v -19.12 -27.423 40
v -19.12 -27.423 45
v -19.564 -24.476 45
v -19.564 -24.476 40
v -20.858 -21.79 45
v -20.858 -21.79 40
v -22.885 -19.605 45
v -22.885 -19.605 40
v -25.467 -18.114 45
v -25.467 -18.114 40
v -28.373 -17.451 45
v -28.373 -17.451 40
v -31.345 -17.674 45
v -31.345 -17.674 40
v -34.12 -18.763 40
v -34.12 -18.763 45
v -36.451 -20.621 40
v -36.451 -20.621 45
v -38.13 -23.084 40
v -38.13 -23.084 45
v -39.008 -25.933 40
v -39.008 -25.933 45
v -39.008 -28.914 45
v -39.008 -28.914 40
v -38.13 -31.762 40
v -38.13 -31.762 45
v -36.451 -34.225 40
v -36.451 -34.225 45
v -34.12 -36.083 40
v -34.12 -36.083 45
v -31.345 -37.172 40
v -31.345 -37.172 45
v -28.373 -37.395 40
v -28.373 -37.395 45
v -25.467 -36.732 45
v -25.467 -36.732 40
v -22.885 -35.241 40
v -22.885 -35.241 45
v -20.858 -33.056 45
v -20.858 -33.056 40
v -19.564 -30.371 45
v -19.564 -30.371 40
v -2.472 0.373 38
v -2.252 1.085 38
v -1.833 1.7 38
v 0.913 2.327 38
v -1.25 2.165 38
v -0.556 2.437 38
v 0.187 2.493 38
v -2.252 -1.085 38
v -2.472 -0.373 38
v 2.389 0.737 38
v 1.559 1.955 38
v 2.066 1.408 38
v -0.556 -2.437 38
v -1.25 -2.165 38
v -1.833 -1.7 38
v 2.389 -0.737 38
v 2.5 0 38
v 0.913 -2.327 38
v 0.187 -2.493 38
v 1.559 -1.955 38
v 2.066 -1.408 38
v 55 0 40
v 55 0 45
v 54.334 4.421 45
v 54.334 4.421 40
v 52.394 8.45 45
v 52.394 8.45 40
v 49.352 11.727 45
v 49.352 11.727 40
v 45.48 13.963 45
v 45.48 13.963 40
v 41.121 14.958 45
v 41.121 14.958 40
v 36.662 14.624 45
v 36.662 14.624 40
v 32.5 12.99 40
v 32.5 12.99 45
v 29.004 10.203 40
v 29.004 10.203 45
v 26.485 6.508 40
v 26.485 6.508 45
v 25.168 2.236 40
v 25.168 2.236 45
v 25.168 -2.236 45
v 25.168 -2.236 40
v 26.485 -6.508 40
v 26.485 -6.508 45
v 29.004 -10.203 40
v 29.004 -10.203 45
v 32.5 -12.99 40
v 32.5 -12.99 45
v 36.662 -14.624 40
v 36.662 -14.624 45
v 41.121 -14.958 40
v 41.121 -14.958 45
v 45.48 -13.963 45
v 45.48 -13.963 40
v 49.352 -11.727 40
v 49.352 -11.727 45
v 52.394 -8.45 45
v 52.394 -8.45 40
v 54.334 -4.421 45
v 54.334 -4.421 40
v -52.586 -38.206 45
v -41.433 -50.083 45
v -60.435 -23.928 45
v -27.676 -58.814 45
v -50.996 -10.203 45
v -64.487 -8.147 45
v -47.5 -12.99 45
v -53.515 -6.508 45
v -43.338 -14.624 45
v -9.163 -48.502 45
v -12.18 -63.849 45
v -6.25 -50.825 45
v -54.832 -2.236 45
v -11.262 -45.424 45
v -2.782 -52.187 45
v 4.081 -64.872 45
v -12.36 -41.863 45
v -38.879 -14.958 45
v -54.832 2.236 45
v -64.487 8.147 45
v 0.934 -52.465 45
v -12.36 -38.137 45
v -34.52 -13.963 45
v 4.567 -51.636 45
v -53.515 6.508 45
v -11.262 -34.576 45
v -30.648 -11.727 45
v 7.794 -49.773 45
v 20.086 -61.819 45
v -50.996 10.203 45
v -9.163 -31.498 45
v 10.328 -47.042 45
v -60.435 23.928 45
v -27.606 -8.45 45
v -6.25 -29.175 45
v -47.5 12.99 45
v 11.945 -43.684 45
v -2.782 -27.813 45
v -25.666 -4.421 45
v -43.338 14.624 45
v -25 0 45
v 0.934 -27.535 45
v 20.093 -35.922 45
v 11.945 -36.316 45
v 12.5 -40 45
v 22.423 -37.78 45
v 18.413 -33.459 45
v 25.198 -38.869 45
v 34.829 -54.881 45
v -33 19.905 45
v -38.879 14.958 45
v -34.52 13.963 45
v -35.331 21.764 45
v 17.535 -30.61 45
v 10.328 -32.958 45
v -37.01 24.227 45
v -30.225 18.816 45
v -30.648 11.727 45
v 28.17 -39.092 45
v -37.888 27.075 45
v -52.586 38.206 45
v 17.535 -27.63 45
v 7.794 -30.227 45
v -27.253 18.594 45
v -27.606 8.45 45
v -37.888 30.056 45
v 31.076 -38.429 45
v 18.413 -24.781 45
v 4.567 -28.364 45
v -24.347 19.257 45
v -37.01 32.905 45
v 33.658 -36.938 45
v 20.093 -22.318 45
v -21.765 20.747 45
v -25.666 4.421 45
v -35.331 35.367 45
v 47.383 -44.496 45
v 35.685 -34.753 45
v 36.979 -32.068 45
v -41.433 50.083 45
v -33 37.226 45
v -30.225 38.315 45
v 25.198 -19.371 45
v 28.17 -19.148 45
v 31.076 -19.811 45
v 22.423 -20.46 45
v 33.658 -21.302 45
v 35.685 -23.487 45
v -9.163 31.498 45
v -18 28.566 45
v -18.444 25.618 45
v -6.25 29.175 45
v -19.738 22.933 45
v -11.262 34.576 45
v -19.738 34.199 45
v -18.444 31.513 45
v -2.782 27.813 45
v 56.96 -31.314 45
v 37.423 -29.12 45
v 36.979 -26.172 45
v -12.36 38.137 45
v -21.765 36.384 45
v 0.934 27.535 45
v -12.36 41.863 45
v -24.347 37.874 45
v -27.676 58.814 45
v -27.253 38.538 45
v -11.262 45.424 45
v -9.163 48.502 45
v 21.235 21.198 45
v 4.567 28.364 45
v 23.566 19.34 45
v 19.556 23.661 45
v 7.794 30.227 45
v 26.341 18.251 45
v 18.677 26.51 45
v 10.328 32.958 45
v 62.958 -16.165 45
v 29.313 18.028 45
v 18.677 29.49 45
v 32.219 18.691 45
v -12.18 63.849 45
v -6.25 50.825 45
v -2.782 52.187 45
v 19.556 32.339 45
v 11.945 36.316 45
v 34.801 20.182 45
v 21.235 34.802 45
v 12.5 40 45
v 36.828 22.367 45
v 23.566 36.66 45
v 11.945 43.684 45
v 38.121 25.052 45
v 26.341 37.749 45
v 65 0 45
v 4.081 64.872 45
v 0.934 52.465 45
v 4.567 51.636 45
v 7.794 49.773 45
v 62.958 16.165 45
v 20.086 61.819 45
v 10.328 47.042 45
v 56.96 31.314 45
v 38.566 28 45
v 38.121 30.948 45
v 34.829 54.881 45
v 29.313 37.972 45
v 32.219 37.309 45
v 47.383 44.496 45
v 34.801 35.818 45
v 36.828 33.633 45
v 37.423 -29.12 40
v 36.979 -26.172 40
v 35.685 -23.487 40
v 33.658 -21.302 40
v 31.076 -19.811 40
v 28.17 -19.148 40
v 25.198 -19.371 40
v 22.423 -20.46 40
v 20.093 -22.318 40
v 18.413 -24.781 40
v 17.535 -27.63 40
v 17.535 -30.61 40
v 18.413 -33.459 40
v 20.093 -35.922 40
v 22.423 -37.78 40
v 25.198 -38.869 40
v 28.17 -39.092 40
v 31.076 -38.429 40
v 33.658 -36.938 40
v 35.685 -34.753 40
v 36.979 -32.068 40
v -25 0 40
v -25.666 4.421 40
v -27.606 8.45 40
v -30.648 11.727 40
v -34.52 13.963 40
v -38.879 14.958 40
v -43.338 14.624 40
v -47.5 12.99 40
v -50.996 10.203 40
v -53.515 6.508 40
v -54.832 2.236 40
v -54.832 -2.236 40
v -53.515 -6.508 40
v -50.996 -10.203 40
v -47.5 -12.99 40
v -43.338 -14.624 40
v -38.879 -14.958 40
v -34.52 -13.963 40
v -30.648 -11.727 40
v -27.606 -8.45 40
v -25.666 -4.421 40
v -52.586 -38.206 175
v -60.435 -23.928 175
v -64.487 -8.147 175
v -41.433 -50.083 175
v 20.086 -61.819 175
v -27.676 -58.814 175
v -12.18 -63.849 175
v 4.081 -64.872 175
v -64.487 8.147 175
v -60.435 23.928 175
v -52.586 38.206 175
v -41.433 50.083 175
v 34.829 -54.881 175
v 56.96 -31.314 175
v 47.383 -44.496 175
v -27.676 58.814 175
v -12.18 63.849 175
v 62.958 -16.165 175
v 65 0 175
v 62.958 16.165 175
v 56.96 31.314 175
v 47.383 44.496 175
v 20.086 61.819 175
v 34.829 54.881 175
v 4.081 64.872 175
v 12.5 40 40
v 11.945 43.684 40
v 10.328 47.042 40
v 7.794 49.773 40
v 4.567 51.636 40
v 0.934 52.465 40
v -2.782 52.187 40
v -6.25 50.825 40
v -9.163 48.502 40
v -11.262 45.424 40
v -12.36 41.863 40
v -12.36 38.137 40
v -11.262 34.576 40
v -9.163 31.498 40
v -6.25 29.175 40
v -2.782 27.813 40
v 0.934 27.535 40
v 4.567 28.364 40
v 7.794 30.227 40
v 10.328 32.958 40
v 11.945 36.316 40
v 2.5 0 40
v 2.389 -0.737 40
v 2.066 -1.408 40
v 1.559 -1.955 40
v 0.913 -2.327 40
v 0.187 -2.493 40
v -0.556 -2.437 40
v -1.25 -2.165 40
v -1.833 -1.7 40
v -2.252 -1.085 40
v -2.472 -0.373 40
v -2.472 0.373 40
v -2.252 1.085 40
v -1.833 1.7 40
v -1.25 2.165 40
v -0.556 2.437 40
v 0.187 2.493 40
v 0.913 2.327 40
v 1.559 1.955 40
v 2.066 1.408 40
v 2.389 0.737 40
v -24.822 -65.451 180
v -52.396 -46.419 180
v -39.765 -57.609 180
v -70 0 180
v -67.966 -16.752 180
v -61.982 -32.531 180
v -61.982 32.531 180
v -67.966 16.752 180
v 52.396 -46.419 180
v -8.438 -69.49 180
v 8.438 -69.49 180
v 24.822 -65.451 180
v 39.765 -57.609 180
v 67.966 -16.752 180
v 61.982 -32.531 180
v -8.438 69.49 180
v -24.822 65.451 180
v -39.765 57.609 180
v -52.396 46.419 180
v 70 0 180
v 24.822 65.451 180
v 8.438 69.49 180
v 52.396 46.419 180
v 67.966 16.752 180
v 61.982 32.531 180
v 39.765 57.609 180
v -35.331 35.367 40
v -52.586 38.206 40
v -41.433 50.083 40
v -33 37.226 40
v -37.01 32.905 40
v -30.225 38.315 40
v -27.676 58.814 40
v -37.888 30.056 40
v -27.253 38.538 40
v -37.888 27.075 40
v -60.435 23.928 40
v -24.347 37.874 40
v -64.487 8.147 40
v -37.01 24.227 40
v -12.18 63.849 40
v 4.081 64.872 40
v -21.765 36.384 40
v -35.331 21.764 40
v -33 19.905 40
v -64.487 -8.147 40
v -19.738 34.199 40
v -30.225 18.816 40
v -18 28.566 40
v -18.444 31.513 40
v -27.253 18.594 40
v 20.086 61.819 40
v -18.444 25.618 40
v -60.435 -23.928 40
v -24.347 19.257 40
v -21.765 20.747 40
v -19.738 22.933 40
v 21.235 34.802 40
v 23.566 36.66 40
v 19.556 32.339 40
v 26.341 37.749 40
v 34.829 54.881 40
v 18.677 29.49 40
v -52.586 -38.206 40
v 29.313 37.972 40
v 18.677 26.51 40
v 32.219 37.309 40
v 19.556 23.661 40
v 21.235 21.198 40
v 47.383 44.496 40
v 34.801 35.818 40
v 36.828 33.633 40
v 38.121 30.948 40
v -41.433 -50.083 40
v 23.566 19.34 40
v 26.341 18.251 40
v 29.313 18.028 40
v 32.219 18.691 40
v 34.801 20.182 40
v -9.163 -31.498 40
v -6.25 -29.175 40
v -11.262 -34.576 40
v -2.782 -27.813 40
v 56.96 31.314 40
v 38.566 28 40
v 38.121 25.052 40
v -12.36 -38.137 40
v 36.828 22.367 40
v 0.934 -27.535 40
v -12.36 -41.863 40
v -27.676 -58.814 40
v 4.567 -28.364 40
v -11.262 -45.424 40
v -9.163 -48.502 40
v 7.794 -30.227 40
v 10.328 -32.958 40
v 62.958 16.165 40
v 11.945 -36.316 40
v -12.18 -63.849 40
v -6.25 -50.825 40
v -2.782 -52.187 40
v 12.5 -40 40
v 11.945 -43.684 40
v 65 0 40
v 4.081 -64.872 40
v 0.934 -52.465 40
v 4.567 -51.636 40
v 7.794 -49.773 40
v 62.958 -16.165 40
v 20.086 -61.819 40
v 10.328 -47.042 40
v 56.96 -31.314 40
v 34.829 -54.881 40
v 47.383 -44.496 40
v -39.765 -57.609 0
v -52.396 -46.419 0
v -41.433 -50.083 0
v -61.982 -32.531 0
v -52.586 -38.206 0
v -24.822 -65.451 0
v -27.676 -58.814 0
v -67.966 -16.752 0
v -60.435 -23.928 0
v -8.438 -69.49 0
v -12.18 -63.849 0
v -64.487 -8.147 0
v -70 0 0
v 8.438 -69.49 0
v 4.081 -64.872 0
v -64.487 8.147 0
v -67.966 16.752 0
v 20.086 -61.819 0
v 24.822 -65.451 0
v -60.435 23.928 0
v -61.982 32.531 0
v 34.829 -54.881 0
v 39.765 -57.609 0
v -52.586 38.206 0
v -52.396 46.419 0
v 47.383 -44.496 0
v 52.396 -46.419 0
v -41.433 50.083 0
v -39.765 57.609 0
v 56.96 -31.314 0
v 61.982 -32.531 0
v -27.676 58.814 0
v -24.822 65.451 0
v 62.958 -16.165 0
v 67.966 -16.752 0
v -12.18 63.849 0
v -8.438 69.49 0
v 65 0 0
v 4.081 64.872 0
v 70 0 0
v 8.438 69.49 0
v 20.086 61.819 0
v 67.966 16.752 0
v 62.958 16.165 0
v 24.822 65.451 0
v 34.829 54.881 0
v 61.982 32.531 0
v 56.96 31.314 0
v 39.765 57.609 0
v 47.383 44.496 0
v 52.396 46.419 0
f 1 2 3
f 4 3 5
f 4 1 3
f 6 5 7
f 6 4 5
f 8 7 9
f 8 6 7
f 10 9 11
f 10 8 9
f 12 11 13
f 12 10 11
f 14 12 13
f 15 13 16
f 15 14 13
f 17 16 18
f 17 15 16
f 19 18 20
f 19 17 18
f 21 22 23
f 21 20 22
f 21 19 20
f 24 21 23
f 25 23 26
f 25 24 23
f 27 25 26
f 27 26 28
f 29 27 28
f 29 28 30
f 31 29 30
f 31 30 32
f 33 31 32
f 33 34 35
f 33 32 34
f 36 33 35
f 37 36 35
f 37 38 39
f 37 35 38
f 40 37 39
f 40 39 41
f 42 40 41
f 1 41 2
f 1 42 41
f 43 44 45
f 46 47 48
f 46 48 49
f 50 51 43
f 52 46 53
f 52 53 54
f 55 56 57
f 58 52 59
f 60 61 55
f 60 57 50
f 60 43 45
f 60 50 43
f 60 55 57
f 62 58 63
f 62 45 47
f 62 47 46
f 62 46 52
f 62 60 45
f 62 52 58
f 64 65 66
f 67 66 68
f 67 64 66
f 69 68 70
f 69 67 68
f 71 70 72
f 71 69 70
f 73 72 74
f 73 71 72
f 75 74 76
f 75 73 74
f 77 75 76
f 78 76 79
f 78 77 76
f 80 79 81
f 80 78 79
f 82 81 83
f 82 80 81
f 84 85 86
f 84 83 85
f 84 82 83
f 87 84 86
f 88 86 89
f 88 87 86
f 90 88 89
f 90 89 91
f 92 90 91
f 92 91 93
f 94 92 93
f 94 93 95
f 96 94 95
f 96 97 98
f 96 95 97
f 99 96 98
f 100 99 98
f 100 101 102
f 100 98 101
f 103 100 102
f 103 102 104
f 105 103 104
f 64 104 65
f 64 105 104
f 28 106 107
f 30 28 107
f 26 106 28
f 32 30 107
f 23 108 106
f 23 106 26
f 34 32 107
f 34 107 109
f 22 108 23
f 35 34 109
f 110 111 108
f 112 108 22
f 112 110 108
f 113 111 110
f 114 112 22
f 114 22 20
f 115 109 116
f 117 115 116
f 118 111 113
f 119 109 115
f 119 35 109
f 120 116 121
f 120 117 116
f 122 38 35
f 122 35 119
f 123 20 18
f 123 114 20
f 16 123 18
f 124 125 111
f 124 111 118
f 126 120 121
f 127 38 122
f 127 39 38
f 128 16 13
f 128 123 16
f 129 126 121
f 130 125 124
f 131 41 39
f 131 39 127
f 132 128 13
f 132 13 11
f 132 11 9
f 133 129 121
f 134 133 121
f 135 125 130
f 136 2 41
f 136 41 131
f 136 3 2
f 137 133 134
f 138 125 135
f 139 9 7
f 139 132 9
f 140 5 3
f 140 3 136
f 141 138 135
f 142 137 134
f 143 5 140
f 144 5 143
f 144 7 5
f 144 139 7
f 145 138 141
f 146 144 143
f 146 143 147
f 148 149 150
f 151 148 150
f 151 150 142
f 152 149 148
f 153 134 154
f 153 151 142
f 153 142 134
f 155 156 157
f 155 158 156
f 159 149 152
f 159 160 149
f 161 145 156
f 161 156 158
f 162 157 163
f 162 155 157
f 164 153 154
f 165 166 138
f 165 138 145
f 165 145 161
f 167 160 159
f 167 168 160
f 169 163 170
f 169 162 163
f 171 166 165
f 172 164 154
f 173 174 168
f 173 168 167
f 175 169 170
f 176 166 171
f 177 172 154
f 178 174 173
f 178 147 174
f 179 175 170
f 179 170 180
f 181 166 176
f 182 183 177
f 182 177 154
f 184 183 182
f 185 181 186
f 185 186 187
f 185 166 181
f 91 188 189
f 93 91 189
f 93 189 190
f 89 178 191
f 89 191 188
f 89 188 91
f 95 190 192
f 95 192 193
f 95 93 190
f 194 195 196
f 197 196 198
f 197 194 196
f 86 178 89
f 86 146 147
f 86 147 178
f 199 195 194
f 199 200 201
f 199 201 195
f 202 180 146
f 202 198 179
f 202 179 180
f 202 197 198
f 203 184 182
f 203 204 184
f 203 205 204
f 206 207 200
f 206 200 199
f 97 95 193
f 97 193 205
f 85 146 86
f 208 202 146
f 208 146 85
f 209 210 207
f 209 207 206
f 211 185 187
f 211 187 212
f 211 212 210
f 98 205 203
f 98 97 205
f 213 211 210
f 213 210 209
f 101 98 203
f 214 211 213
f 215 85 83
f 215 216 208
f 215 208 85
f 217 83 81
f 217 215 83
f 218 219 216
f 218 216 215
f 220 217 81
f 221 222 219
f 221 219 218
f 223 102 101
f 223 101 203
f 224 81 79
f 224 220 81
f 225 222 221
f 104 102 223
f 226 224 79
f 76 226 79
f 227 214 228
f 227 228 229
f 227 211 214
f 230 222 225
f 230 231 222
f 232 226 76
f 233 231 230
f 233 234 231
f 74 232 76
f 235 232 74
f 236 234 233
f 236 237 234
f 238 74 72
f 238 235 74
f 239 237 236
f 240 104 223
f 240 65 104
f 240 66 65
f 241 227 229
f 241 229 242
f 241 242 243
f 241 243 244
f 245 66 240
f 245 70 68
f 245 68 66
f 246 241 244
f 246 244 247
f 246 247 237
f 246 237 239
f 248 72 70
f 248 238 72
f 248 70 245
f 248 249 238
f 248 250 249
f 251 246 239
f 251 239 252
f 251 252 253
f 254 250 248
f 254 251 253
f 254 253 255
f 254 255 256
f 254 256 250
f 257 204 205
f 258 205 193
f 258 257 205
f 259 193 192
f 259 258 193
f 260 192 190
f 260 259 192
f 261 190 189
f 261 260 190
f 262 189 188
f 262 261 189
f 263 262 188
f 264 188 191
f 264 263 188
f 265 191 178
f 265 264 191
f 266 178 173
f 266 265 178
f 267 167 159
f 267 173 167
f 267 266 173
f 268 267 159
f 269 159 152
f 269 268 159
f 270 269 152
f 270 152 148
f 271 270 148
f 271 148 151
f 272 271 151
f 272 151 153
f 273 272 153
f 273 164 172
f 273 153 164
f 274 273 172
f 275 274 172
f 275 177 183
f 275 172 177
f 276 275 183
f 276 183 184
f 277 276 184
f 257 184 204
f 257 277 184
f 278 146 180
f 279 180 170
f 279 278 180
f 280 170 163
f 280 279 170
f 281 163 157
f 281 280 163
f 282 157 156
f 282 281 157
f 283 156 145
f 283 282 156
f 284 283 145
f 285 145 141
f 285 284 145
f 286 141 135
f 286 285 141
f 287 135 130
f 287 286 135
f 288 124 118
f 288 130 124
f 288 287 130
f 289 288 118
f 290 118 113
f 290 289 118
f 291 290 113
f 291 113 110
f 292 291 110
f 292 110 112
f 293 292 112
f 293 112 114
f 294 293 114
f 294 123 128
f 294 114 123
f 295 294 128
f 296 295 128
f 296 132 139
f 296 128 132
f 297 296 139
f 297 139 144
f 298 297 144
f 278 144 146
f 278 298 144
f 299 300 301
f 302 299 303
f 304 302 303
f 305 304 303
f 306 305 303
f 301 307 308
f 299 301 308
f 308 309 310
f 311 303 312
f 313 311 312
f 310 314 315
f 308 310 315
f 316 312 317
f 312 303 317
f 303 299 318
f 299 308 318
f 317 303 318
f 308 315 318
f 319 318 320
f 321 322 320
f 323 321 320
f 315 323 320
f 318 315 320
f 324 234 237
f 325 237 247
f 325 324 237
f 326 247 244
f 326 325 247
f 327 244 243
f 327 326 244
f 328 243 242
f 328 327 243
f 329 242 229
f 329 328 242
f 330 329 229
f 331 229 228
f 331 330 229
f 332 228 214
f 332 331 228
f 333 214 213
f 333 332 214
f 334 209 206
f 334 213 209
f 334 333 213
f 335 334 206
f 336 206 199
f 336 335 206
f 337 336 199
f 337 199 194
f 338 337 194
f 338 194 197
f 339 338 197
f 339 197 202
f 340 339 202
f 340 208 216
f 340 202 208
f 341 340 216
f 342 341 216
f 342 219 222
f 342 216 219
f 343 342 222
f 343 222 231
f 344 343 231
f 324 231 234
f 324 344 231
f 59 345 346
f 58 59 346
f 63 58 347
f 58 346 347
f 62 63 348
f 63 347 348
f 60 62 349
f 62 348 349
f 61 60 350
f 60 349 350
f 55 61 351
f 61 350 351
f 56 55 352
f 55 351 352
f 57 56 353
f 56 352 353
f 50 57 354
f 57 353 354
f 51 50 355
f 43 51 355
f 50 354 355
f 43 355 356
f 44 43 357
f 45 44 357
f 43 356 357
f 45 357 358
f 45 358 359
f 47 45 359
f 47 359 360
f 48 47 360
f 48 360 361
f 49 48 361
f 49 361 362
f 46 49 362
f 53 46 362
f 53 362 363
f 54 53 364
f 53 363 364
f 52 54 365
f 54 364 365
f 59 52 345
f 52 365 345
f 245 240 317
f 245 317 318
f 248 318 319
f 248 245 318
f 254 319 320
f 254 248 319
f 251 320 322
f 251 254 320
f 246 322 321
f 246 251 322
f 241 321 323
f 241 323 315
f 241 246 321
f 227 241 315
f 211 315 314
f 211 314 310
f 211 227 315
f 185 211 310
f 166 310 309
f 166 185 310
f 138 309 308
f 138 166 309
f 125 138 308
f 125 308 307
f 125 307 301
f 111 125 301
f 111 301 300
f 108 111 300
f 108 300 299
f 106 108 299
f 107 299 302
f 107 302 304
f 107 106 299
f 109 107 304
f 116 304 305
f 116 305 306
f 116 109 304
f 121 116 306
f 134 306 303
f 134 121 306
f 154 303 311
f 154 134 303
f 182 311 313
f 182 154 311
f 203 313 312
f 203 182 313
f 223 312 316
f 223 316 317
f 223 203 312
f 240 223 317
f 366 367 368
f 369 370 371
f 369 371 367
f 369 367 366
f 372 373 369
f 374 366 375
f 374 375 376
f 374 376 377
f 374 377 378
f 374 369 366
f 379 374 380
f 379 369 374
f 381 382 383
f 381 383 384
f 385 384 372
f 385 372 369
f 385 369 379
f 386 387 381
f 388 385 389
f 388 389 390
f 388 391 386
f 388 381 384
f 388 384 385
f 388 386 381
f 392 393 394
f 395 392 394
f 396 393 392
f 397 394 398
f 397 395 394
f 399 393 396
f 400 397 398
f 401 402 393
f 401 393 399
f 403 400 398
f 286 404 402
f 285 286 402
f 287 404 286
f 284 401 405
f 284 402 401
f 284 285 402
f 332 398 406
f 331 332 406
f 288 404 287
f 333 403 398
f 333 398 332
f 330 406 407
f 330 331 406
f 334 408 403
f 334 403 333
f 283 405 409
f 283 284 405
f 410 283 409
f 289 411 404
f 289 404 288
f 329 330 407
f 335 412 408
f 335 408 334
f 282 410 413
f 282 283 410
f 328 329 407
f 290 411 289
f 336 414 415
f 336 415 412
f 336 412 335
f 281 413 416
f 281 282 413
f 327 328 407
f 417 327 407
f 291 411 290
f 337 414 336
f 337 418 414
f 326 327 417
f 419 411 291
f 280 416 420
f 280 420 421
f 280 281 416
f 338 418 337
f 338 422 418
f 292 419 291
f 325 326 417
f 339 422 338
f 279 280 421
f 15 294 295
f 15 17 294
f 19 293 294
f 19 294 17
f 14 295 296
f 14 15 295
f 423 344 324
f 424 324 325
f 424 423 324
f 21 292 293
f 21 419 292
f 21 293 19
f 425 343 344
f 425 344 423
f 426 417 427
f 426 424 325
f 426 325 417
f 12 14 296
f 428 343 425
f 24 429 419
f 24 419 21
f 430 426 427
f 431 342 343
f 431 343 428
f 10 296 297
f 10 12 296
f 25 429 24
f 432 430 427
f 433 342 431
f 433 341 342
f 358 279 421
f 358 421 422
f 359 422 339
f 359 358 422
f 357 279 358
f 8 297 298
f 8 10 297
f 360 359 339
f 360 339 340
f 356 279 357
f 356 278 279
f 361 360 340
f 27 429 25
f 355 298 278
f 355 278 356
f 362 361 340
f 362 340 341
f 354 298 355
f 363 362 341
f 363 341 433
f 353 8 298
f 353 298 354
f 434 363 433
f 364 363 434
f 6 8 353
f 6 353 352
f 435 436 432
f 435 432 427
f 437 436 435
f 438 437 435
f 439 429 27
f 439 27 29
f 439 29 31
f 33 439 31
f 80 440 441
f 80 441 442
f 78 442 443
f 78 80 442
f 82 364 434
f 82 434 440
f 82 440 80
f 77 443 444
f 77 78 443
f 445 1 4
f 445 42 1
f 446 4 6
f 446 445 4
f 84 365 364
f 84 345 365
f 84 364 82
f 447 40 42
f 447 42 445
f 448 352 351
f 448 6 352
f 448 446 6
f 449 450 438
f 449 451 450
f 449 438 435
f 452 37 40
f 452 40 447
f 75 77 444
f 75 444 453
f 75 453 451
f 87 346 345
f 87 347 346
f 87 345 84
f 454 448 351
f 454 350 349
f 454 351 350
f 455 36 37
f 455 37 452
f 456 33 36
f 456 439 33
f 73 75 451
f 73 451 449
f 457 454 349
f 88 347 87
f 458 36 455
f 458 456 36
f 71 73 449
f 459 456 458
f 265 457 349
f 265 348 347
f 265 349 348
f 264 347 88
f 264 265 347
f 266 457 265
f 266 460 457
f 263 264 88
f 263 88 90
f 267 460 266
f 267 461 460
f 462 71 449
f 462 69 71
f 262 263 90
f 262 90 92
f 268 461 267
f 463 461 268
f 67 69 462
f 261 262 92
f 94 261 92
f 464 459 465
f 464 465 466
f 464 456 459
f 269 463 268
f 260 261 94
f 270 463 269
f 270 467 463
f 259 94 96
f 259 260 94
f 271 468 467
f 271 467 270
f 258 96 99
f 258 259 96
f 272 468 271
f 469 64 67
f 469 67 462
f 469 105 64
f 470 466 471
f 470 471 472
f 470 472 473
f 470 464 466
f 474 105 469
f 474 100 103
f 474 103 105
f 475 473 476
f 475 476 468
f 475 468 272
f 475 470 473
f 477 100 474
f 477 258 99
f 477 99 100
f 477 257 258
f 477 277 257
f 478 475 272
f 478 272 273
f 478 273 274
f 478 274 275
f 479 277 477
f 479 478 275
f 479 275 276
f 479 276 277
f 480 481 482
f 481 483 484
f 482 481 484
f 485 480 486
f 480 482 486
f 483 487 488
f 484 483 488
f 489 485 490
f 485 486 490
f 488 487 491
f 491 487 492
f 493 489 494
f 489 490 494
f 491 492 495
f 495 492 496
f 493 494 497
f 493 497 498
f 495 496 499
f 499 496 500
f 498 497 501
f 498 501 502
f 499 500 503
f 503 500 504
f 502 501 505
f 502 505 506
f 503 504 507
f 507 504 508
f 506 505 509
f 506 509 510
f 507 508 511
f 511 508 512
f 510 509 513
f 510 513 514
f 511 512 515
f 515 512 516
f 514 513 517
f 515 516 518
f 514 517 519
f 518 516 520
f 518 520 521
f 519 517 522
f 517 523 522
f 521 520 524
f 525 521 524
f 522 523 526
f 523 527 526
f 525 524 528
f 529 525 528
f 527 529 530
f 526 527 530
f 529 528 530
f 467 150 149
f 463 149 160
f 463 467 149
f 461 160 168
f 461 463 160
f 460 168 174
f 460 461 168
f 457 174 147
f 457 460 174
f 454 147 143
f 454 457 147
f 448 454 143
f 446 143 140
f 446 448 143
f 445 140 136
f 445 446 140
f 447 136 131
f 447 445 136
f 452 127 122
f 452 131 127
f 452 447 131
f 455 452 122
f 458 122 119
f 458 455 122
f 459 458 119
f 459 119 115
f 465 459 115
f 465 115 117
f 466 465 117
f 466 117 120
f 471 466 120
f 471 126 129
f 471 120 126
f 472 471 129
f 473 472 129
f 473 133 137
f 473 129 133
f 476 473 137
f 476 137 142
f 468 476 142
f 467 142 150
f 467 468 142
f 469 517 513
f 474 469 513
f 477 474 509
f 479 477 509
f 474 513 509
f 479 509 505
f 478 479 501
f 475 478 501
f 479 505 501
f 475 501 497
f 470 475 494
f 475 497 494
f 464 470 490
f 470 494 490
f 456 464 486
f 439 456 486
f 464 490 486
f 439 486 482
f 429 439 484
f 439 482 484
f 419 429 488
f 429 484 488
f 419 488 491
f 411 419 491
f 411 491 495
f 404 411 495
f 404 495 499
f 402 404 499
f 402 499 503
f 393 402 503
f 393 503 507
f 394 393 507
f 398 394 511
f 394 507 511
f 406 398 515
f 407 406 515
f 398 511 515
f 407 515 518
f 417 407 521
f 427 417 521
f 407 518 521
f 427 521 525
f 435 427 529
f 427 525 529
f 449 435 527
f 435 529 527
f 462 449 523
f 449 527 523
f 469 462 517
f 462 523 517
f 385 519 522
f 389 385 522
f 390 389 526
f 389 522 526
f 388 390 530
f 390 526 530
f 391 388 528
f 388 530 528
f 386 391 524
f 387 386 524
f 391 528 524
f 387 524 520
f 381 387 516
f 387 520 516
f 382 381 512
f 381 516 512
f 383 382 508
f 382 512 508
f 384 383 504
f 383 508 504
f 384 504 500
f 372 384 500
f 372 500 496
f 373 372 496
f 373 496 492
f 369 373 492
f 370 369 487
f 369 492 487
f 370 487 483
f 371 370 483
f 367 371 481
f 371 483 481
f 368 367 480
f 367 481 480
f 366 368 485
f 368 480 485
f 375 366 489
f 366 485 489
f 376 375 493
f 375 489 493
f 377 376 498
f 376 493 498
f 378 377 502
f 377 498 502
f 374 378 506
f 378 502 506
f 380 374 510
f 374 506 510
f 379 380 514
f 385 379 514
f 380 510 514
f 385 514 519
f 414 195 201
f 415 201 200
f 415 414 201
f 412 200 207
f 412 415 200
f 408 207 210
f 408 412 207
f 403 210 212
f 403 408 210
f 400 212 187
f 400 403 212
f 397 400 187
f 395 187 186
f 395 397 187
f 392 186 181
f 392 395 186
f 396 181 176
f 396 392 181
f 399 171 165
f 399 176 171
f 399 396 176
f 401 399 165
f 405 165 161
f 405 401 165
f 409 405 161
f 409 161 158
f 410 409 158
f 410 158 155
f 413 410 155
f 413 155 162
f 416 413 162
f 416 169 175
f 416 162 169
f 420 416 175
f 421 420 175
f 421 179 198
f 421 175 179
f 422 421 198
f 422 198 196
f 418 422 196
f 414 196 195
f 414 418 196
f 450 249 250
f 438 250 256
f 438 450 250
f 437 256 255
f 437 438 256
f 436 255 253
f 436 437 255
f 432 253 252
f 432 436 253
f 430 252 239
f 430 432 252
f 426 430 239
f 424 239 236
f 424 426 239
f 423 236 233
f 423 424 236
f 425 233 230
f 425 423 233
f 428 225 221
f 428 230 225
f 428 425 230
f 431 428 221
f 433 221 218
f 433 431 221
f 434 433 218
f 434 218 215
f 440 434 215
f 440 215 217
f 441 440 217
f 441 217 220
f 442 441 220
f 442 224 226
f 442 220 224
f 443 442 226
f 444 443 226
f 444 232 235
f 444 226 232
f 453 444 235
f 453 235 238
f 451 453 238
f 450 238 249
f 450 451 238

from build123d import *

# Parameters (mm, degrees)
F0_R      = 70
F1_DEPTH  = 180
F2_R      = 65
F3_DEPTH  = 40
F5_R      = 15
F5_R_2    = 12.5
F5_R_3    = 10
F6_DEPTH  = 125
F8_R      = 65
F9_DEPTH  = 130
F10_R     = 2.5
F11_DEPTH = 2


with BuildPart() as f1:
    # F0 (on Top) → F1 (new body)
    with BuildSketch(Plane.XY):
        Circle(F0_R)
    extrude(amount=F1_DEPTH)

    # F2 (on face) → F3 (cut)
    with BuildSketch(Plane(origin=(0, 0, 0), x_dir=(1, 0, 0), z_dir=(0, 0, -1))):
        Circle(F2_R)
    extrude(amount=-F3_DEPTH, mode=Mode.SUBTRACT)

    # F5 (on offset) → F6 (cut)
    with BuildSketch(Plane.XY.offset(40)):
        with Locations((40, 0)):
            Circle(F5_R)
        with Locations((-40, 0)):
            Circle(F5_R)
        with Locations((0, 40)):
            Circle(F5_R_2)
        with Locations((0, -40)):
            Circle(F5_R_2)
        with Locations((-28, 28.565714)):
            Circle(F5_R_3)
        with Locations((27.423085, -29.12)):
            Circle(F5_R_3)
        with Locations((-29.12, -27.423085)):
            Circle(F5_R_3)
        with Locations((28.565714, 28)):
            Circle(F5_R_3)
    extrude(amount=F6_DEPTH, mode=Mode.SUBTRACT)

    # F8 (on offset) → F9 (cut)
    with BuildSketch(Plane.XY.offset(45)):
        Circle(F8_R)
    extrude(amount=F9_DEPTH, mode=Mode.SUBTRACT)

    # F10 (on face) → F11 (join)
    with BuildSketch(Plane(origin=(0, 0, 40), x_dir=(1, 0, 0), z_dir=(0, 0, -1))):
        Circle(F10_R)
    extrude(amount=F11_DEPTH)


solid = f1.part
